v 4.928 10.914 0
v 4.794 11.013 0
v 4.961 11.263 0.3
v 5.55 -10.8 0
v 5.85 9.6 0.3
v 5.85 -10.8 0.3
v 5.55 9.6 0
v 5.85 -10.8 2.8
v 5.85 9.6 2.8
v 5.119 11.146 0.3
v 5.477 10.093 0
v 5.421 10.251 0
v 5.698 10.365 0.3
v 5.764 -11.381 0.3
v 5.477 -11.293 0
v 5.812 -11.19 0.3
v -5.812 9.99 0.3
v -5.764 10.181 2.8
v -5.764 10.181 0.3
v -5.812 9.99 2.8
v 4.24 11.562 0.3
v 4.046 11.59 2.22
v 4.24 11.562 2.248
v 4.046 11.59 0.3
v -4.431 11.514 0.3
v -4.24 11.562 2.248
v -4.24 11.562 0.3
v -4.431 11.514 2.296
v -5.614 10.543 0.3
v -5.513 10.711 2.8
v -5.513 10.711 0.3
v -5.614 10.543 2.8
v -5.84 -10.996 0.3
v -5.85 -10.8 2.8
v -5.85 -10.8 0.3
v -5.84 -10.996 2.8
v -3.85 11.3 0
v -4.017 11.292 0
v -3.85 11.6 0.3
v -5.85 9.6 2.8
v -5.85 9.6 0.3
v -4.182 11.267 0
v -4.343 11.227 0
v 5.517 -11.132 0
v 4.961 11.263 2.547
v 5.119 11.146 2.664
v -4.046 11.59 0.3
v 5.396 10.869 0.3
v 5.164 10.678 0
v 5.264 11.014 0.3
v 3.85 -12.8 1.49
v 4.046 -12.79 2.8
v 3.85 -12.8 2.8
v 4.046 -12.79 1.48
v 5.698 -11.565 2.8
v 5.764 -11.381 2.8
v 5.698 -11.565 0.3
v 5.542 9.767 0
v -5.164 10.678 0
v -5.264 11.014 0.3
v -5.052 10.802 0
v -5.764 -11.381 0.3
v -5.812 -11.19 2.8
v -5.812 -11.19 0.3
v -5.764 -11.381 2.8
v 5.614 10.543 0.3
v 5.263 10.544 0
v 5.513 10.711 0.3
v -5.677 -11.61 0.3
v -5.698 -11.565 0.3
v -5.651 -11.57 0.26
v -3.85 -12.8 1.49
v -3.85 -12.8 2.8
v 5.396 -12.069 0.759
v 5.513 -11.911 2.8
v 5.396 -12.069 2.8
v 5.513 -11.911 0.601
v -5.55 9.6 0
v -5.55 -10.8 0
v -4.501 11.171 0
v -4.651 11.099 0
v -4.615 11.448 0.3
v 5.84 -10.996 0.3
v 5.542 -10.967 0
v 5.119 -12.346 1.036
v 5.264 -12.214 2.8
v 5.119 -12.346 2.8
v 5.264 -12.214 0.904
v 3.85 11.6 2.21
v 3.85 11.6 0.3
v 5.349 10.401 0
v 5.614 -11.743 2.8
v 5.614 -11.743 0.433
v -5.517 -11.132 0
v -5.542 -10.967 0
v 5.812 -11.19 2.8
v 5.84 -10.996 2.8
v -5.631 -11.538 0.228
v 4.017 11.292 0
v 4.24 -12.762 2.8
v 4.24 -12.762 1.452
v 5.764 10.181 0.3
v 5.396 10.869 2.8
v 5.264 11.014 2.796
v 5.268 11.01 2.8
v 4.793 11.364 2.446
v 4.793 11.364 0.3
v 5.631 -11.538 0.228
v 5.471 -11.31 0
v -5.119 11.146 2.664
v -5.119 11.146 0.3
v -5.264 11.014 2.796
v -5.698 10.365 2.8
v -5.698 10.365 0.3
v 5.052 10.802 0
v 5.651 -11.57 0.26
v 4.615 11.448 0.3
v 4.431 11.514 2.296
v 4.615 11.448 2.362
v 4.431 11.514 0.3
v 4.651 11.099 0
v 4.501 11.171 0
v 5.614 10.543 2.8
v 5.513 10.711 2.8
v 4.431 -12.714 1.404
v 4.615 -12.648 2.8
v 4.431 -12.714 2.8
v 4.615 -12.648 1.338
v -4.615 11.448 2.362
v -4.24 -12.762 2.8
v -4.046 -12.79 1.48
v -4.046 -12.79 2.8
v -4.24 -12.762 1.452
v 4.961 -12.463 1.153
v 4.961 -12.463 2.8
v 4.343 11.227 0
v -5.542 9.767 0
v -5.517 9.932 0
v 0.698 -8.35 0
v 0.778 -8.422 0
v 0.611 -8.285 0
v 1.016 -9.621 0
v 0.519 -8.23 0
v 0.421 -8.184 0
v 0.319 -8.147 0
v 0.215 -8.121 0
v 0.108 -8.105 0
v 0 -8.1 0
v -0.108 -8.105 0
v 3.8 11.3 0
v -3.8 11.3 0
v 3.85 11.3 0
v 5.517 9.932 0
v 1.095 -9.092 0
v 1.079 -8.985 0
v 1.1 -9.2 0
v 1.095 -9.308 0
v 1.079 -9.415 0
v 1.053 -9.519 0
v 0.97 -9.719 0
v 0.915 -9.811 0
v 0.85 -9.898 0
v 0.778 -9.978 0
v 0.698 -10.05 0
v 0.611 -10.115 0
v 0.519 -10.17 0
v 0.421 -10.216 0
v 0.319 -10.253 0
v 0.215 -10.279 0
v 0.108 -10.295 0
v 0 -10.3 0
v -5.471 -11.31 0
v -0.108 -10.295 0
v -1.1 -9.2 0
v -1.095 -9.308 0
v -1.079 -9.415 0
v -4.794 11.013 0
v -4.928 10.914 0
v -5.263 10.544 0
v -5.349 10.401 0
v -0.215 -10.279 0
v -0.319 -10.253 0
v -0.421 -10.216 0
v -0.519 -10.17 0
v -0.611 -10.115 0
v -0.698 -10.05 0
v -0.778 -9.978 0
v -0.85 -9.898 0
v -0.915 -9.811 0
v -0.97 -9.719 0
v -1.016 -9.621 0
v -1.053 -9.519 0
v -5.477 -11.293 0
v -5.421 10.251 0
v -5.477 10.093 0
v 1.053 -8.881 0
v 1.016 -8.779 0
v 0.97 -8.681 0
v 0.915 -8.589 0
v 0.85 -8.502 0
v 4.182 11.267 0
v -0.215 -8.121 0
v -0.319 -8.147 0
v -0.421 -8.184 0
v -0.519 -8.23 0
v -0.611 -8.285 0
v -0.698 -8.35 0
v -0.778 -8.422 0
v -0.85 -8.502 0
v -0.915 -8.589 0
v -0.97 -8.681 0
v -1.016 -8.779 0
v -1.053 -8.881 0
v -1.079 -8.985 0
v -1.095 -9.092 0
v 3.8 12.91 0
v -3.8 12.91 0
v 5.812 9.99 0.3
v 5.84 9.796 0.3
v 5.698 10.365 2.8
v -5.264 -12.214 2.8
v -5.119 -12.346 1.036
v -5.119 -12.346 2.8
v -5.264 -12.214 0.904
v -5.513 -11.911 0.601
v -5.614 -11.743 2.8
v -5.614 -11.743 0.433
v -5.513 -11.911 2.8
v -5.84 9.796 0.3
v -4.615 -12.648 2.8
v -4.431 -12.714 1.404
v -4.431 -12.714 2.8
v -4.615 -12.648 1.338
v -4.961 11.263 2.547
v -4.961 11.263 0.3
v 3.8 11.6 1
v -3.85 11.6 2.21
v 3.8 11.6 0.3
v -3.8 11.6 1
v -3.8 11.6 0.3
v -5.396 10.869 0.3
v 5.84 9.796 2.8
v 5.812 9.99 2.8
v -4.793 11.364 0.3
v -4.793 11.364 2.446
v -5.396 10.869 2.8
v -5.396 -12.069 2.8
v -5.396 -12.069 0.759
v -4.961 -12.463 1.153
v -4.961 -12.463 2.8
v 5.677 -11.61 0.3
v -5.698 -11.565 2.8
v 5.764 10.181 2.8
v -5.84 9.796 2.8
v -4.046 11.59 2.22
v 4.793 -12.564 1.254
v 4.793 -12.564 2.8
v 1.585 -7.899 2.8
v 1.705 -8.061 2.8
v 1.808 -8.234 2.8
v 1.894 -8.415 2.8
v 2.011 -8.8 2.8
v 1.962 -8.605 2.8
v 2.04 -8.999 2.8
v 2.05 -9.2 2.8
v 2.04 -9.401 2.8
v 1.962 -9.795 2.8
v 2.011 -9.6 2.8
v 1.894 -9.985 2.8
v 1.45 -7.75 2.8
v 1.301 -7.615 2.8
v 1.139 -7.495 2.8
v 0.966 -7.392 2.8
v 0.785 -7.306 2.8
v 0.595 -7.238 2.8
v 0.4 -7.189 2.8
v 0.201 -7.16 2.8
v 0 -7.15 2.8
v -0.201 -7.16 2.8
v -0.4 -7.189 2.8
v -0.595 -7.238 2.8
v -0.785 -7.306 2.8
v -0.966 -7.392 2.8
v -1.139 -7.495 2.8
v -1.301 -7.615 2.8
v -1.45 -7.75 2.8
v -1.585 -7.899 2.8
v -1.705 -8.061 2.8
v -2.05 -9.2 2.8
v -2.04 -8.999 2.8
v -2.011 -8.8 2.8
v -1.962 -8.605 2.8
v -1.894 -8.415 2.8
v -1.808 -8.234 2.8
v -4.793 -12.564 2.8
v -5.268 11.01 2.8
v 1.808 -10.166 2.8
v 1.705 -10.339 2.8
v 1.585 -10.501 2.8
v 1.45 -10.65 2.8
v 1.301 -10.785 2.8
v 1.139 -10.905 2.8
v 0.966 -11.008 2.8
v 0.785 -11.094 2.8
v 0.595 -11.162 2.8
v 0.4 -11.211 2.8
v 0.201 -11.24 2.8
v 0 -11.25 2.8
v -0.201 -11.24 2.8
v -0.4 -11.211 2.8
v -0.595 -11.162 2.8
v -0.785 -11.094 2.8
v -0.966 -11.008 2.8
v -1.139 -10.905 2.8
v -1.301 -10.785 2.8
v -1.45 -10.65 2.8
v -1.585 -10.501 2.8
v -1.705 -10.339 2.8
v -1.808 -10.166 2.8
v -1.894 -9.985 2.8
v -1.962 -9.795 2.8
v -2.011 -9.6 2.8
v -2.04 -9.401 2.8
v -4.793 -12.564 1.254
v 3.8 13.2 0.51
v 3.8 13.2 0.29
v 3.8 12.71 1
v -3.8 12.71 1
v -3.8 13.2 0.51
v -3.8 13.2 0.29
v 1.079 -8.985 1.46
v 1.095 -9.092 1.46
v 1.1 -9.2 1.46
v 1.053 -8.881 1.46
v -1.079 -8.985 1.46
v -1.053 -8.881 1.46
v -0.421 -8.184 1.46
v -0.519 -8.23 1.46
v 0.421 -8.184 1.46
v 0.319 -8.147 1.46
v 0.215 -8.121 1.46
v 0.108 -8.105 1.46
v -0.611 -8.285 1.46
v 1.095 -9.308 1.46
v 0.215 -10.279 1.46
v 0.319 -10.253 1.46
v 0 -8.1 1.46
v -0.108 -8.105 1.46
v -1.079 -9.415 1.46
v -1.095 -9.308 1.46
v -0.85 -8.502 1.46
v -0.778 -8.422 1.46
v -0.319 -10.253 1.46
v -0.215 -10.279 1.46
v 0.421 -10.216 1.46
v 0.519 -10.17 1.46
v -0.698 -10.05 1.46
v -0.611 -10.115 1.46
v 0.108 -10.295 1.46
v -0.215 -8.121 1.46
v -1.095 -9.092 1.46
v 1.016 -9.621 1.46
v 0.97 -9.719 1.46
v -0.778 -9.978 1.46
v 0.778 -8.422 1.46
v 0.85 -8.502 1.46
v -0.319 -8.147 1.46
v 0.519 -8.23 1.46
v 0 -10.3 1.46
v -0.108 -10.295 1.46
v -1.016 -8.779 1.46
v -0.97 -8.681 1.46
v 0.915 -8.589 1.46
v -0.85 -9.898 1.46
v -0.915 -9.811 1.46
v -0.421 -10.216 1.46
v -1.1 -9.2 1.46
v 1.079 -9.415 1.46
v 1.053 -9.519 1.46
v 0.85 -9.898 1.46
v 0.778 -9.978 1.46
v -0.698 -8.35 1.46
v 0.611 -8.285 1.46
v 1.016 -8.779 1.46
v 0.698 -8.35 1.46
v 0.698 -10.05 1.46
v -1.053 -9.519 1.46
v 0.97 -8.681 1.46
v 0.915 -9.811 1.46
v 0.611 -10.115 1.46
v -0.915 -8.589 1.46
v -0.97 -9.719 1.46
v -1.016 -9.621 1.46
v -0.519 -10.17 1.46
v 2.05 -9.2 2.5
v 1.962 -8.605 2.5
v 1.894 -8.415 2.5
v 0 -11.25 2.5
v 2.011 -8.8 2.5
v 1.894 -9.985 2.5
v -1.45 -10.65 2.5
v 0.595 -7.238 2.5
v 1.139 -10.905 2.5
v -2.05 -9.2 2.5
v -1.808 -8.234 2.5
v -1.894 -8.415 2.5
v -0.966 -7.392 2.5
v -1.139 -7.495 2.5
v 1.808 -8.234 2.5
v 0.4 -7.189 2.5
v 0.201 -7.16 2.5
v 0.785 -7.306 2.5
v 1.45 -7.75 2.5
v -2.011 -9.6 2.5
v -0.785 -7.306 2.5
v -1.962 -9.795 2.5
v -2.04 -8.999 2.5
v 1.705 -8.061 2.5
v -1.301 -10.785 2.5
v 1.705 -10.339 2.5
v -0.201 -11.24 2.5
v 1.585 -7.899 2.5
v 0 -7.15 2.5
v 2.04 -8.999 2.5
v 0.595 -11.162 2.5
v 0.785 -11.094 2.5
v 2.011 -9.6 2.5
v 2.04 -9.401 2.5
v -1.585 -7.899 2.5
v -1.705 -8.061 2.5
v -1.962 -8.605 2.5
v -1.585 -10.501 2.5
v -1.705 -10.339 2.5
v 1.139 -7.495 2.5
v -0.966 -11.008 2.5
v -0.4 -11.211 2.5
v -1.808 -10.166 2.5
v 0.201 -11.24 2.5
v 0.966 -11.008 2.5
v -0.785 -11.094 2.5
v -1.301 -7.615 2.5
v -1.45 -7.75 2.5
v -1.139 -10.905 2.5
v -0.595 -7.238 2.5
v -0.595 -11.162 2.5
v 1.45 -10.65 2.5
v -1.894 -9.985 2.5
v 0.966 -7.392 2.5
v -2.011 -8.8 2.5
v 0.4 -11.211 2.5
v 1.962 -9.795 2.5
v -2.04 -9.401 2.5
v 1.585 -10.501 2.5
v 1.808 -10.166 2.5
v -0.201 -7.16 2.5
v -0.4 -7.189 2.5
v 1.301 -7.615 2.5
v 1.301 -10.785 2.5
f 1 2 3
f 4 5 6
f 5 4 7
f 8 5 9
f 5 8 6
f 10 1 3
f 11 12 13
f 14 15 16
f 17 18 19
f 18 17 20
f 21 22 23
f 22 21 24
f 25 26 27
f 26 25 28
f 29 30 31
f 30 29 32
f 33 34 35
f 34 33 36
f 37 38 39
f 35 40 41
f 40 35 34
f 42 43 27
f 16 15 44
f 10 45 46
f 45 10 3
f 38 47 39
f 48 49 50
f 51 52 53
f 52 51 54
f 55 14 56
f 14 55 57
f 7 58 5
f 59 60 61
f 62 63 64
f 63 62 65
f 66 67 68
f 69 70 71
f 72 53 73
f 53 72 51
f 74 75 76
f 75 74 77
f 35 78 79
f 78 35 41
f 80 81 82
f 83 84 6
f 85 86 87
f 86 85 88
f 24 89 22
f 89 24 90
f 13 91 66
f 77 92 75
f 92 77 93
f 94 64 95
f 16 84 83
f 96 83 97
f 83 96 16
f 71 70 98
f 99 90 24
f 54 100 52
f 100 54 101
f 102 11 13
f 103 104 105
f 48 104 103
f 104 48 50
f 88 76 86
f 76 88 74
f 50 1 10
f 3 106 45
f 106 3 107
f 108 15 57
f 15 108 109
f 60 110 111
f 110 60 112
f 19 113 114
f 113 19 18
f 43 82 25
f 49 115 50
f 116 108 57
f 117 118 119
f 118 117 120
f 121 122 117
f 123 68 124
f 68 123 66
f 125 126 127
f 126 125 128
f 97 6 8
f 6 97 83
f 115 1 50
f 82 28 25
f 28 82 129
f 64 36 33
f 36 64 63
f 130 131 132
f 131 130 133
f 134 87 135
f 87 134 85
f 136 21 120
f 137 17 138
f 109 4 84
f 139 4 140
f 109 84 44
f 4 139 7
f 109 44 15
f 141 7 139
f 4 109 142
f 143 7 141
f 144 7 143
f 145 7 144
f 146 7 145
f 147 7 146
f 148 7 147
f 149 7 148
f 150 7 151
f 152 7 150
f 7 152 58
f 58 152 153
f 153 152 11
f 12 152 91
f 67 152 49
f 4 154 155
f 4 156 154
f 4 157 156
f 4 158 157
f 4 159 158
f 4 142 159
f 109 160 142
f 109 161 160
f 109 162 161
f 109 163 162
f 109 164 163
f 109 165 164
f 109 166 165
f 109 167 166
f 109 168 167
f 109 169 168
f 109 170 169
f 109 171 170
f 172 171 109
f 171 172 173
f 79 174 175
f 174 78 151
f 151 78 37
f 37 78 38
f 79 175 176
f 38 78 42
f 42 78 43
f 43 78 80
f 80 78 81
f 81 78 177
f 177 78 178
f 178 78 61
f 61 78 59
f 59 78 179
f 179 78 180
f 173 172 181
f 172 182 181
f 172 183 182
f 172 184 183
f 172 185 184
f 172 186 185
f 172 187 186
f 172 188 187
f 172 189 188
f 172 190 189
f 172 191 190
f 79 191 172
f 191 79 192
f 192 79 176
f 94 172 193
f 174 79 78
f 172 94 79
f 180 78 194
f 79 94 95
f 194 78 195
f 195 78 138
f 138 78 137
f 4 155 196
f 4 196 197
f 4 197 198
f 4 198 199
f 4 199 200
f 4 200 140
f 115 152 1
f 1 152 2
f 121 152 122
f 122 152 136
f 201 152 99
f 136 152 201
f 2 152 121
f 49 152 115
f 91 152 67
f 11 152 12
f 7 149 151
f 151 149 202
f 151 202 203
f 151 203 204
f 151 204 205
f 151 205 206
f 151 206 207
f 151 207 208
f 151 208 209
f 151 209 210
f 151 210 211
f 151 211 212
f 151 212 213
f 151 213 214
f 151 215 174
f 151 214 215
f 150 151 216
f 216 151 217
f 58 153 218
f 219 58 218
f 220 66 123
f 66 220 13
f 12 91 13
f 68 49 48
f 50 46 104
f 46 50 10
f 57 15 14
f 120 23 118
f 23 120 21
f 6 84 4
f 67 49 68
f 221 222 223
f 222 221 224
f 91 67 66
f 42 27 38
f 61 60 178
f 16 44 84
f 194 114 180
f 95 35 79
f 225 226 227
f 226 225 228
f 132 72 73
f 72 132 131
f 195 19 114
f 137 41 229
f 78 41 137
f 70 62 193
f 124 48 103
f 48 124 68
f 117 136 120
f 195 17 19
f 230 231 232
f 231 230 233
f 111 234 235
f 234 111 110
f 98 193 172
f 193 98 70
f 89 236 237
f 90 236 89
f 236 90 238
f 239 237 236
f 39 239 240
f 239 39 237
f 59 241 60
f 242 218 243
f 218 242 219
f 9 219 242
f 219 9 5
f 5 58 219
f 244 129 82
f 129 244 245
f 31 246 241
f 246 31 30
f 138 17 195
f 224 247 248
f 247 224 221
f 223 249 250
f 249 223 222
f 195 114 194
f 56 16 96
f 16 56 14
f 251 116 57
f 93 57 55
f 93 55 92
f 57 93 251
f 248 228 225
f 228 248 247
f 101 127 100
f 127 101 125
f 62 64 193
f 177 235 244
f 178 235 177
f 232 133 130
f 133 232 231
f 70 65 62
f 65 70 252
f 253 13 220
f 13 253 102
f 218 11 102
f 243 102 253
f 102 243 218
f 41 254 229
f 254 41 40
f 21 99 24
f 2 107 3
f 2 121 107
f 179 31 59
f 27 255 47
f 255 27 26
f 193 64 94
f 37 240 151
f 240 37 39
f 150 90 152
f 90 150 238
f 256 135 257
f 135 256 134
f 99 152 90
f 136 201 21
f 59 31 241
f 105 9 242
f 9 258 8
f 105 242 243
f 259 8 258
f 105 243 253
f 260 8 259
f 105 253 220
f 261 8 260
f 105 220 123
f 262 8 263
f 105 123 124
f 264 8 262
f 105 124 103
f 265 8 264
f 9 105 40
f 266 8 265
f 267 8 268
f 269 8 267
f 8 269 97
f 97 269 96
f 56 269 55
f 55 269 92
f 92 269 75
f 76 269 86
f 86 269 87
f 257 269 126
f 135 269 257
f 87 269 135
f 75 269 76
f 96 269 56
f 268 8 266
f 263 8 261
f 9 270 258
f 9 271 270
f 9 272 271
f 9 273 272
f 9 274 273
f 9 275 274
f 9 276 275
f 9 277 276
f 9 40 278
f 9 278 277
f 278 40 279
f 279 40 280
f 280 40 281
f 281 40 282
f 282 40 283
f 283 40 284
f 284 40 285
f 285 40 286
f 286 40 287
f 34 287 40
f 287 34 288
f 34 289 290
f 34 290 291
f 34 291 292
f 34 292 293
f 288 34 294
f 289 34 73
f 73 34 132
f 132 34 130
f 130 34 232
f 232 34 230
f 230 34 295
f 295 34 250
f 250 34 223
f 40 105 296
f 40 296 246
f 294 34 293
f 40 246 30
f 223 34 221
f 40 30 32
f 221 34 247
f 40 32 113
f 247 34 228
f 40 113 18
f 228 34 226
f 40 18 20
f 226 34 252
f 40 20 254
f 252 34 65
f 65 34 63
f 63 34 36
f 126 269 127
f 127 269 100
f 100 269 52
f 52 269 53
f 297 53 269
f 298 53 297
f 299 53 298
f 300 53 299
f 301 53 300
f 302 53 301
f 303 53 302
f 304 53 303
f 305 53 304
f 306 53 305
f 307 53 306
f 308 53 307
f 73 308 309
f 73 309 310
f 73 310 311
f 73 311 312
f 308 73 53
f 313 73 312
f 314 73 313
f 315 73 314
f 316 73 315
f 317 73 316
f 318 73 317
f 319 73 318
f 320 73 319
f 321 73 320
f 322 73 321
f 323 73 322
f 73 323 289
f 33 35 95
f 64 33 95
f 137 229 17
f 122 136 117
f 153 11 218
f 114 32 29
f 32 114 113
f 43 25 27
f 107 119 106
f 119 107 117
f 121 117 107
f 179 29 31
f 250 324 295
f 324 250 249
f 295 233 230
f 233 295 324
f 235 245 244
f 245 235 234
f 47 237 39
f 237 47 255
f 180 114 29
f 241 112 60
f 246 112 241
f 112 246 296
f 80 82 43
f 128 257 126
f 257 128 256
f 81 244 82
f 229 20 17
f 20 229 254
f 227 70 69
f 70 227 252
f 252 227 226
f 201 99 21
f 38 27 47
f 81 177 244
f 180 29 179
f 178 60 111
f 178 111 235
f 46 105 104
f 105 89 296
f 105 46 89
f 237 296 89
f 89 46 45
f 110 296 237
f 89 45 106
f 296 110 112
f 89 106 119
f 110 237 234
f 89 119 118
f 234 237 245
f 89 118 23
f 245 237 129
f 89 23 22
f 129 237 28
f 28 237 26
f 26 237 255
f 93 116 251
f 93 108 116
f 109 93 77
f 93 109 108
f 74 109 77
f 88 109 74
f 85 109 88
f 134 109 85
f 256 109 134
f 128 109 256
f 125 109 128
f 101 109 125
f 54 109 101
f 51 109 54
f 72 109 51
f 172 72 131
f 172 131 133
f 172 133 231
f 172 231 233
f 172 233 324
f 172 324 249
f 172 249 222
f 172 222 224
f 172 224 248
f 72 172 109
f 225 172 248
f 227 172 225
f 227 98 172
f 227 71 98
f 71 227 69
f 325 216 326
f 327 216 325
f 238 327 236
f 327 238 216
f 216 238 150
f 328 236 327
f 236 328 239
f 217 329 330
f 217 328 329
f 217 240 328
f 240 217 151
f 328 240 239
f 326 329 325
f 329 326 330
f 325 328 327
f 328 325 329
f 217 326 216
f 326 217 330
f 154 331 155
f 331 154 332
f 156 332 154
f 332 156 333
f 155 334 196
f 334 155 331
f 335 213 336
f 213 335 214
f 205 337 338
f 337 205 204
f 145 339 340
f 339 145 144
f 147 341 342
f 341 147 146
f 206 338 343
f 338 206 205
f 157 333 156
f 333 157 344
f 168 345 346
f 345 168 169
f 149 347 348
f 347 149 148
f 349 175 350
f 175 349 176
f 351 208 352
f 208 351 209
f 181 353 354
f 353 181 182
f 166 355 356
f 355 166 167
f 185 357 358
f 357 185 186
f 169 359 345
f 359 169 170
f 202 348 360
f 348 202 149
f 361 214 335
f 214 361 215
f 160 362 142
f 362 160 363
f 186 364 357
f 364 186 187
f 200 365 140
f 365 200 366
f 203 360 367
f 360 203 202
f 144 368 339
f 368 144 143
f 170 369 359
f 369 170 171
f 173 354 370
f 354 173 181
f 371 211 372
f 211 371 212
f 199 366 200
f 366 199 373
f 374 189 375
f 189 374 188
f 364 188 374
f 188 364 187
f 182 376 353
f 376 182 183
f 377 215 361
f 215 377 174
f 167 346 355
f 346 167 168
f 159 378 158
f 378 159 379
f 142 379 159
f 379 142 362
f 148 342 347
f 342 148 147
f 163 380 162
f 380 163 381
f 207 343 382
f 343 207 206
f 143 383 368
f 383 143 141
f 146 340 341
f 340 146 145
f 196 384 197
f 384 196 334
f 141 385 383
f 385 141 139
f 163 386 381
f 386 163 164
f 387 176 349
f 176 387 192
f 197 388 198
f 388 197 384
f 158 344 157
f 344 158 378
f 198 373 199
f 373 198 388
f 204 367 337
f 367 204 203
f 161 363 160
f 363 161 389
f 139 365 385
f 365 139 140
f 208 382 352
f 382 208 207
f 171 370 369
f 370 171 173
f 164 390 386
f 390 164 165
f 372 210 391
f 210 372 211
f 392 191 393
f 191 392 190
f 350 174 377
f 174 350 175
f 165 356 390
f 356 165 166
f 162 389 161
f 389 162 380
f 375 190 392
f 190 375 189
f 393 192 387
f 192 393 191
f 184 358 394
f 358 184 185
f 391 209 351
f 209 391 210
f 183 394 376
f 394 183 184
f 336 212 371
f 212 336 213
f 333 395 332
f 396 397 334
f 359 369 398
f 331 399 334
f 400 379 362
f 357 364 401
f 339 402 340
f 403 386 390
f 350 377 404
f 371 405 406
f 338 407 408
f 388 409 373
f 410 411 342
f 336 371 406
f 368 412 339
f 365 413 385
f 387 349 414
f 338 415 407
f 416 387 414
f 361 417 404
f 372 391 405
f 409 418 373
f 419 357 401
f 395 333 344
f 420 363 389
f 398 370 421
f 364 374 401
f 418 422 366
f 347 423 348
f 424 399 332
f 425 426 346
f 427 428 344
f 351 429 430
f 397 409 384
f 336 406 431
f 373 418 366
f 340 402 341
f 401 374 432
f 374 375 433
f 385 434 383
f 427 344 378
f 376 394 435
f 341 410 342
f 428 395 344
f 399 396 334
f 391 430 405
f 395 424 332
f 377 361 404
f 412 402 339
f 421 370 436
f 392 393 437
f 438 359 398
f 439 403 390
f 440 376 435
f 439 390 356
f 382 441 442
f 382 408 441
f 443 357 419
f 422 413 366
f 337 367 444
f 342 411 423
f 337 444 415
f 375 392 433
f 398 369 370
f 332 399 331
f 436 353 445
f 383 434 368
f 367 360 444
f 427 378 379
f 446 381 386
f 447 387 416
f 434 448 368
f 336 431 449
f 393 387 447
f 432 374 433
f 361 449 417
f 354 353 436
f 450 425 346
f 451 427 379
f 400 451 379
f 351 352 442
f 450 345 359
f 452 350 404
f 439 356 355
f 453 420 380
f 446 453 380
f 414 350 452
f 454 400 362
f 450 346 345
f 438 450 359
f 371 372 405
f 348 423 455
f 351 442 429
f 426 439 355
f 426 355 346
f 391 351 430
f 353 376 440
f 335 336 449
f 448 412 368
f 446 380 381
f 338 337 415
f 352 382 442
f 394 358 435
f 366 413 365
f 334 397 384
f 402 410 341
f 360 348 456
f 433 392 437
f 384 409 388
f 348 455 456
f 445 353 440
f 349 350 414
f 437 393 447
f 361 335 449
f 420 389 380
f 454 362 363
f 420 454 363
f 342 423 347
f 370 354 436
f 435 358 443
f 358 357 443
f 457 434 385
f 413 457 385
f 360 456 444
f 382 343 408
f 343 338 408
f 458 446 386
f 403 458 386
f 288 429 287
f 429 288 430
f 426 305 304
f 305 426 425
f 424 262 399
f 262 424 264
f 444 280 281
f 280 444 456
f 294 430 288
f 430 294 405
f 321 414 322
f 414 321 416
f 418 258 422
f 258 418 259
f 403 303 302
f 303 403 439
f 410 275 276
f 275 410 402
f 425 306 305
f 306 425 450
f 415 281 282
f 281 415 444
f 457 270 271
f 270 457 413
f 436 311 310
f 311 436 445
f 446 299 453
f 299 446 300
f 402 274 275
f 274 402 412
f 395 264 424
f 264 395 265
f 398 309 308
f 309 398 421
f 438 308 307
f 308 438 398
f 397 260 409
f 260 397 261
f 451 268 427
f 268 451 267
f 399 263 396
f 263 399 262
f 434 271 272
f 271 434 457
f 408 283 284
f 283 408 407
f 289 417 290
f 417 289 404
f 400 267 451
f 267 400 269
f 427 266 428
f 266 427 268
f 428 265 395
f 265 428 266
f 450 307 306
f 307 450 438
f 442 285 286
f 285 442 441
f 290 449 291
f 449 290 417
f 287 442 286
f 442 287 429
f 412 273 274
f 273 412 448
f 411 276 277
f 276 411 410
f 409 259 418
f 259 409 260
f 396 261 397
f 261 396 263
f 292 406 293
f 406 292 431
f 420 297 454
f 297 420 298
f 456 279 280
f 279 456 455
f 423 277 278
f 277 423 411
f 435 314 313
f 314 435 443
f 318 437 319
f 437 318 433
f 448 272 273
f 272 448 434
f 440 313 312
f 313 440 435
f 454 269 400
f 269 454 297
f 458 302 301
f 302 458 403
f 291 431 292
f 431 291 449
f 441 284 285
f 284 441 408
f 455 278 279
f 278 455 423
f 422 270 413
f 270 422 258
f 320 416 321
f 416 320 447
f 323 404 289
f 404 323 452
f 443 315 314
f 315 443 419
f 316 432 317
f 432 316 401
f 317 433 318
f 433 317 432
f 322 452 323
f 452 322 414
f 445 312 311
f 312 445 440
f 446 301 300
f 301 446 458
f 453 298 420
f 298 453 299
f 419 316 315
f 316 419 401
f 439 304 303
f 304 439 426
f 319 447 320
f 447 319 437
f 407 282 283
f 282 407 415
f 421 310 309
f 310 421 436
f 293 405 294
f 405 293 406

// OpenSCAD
// Replacement for the upstream counterweight-lid-lead_v1.0, same frame: inner face on z = 0, tongue towards +y.

$fn = 64;

width = 11.7;
corner_r = 2.0;
thickness = 2.8;
screw_end_y = -12.8;
top_end_y = 11.6;

// the slot behind the lip is 1.5 deep; a thinner tongue lets the lid tilt in past the lip
tongue_w = 7.6;
tongue_t = 1.0;
tongue_tip_y = 13.2;
tongue_tip_chamfer = 0.5;

top_chamfer = 0.6;
screw_end_chamfer = 1.5;
foot_chamfer = 0.3;

hole_y = -9.2;
hole_d = 2.2;
csk_d = 4.1;
csk_z0 = 1.46;
csk_z1 = 2.5;

module plan(inset = 0)
    offset(r = corner_r - inset) offset(delta = -corner_r)
        translate([-width / 2, screw_end_y]) square([width, top_end_y - screw_end_y]);

module chamfer_cut(y0, z0, dy, dz)
    translate([-width, 0, 0]) rotate([90, 0, 90]) linear_extrude(2 * width)
        polygon([[y0, z0], [y0 + dy, z0], [y0, z0 + dz]]);

module body() difference() {
    hull() {
        linear_extrude(0.01) plan(foot_chamfer);
        translate([0, 0, foot_chamfer]) linear_extrude(thickness - foot_chamfer) plan();
    }
    chamfer_cut(top_end_y + 0.01, thickness + 0.01, -top_chamfer - 0.01, -top_chamfer - 0.01);
    chamfer_cut(screw_end_y - 0.01, -0.01, screw_end_chamfer + 0.01, screw_end_chamfer + 0.01);
}

module tongue() difference() {
    translate([-tongue_w / 2, top_end_y - 1, 0]) cube([tongue_w, tongue_tip_y - top_end_y + 1, tongue_t]);
    chamfer_cut(tongue_tip_y + 0.01, tongue_t + 0.01, -tongue_tip_chamfer - 0.01, -tongue_tip_chamfer - 0.01);
    chamfer_cut(tongue_tip_y + 0.01, -0.01, -foot_chamfer - 0.01, foot_chamfer + 0.01);
}

difference() {
    union() {
        body();
        tongue();
    }
    translate([0, hole_y, -1]) cylinder(d = hole_d, h = thickness + 2);
    translate([0, hole_y, csk_z0]) cylinder(d1 = hole_d, d2 = csk_d, h = csk_z1 - csk_z0);
    translate([0, hole_y, csk_z1]) cylinder(d = csk_d, h = 1);
}
